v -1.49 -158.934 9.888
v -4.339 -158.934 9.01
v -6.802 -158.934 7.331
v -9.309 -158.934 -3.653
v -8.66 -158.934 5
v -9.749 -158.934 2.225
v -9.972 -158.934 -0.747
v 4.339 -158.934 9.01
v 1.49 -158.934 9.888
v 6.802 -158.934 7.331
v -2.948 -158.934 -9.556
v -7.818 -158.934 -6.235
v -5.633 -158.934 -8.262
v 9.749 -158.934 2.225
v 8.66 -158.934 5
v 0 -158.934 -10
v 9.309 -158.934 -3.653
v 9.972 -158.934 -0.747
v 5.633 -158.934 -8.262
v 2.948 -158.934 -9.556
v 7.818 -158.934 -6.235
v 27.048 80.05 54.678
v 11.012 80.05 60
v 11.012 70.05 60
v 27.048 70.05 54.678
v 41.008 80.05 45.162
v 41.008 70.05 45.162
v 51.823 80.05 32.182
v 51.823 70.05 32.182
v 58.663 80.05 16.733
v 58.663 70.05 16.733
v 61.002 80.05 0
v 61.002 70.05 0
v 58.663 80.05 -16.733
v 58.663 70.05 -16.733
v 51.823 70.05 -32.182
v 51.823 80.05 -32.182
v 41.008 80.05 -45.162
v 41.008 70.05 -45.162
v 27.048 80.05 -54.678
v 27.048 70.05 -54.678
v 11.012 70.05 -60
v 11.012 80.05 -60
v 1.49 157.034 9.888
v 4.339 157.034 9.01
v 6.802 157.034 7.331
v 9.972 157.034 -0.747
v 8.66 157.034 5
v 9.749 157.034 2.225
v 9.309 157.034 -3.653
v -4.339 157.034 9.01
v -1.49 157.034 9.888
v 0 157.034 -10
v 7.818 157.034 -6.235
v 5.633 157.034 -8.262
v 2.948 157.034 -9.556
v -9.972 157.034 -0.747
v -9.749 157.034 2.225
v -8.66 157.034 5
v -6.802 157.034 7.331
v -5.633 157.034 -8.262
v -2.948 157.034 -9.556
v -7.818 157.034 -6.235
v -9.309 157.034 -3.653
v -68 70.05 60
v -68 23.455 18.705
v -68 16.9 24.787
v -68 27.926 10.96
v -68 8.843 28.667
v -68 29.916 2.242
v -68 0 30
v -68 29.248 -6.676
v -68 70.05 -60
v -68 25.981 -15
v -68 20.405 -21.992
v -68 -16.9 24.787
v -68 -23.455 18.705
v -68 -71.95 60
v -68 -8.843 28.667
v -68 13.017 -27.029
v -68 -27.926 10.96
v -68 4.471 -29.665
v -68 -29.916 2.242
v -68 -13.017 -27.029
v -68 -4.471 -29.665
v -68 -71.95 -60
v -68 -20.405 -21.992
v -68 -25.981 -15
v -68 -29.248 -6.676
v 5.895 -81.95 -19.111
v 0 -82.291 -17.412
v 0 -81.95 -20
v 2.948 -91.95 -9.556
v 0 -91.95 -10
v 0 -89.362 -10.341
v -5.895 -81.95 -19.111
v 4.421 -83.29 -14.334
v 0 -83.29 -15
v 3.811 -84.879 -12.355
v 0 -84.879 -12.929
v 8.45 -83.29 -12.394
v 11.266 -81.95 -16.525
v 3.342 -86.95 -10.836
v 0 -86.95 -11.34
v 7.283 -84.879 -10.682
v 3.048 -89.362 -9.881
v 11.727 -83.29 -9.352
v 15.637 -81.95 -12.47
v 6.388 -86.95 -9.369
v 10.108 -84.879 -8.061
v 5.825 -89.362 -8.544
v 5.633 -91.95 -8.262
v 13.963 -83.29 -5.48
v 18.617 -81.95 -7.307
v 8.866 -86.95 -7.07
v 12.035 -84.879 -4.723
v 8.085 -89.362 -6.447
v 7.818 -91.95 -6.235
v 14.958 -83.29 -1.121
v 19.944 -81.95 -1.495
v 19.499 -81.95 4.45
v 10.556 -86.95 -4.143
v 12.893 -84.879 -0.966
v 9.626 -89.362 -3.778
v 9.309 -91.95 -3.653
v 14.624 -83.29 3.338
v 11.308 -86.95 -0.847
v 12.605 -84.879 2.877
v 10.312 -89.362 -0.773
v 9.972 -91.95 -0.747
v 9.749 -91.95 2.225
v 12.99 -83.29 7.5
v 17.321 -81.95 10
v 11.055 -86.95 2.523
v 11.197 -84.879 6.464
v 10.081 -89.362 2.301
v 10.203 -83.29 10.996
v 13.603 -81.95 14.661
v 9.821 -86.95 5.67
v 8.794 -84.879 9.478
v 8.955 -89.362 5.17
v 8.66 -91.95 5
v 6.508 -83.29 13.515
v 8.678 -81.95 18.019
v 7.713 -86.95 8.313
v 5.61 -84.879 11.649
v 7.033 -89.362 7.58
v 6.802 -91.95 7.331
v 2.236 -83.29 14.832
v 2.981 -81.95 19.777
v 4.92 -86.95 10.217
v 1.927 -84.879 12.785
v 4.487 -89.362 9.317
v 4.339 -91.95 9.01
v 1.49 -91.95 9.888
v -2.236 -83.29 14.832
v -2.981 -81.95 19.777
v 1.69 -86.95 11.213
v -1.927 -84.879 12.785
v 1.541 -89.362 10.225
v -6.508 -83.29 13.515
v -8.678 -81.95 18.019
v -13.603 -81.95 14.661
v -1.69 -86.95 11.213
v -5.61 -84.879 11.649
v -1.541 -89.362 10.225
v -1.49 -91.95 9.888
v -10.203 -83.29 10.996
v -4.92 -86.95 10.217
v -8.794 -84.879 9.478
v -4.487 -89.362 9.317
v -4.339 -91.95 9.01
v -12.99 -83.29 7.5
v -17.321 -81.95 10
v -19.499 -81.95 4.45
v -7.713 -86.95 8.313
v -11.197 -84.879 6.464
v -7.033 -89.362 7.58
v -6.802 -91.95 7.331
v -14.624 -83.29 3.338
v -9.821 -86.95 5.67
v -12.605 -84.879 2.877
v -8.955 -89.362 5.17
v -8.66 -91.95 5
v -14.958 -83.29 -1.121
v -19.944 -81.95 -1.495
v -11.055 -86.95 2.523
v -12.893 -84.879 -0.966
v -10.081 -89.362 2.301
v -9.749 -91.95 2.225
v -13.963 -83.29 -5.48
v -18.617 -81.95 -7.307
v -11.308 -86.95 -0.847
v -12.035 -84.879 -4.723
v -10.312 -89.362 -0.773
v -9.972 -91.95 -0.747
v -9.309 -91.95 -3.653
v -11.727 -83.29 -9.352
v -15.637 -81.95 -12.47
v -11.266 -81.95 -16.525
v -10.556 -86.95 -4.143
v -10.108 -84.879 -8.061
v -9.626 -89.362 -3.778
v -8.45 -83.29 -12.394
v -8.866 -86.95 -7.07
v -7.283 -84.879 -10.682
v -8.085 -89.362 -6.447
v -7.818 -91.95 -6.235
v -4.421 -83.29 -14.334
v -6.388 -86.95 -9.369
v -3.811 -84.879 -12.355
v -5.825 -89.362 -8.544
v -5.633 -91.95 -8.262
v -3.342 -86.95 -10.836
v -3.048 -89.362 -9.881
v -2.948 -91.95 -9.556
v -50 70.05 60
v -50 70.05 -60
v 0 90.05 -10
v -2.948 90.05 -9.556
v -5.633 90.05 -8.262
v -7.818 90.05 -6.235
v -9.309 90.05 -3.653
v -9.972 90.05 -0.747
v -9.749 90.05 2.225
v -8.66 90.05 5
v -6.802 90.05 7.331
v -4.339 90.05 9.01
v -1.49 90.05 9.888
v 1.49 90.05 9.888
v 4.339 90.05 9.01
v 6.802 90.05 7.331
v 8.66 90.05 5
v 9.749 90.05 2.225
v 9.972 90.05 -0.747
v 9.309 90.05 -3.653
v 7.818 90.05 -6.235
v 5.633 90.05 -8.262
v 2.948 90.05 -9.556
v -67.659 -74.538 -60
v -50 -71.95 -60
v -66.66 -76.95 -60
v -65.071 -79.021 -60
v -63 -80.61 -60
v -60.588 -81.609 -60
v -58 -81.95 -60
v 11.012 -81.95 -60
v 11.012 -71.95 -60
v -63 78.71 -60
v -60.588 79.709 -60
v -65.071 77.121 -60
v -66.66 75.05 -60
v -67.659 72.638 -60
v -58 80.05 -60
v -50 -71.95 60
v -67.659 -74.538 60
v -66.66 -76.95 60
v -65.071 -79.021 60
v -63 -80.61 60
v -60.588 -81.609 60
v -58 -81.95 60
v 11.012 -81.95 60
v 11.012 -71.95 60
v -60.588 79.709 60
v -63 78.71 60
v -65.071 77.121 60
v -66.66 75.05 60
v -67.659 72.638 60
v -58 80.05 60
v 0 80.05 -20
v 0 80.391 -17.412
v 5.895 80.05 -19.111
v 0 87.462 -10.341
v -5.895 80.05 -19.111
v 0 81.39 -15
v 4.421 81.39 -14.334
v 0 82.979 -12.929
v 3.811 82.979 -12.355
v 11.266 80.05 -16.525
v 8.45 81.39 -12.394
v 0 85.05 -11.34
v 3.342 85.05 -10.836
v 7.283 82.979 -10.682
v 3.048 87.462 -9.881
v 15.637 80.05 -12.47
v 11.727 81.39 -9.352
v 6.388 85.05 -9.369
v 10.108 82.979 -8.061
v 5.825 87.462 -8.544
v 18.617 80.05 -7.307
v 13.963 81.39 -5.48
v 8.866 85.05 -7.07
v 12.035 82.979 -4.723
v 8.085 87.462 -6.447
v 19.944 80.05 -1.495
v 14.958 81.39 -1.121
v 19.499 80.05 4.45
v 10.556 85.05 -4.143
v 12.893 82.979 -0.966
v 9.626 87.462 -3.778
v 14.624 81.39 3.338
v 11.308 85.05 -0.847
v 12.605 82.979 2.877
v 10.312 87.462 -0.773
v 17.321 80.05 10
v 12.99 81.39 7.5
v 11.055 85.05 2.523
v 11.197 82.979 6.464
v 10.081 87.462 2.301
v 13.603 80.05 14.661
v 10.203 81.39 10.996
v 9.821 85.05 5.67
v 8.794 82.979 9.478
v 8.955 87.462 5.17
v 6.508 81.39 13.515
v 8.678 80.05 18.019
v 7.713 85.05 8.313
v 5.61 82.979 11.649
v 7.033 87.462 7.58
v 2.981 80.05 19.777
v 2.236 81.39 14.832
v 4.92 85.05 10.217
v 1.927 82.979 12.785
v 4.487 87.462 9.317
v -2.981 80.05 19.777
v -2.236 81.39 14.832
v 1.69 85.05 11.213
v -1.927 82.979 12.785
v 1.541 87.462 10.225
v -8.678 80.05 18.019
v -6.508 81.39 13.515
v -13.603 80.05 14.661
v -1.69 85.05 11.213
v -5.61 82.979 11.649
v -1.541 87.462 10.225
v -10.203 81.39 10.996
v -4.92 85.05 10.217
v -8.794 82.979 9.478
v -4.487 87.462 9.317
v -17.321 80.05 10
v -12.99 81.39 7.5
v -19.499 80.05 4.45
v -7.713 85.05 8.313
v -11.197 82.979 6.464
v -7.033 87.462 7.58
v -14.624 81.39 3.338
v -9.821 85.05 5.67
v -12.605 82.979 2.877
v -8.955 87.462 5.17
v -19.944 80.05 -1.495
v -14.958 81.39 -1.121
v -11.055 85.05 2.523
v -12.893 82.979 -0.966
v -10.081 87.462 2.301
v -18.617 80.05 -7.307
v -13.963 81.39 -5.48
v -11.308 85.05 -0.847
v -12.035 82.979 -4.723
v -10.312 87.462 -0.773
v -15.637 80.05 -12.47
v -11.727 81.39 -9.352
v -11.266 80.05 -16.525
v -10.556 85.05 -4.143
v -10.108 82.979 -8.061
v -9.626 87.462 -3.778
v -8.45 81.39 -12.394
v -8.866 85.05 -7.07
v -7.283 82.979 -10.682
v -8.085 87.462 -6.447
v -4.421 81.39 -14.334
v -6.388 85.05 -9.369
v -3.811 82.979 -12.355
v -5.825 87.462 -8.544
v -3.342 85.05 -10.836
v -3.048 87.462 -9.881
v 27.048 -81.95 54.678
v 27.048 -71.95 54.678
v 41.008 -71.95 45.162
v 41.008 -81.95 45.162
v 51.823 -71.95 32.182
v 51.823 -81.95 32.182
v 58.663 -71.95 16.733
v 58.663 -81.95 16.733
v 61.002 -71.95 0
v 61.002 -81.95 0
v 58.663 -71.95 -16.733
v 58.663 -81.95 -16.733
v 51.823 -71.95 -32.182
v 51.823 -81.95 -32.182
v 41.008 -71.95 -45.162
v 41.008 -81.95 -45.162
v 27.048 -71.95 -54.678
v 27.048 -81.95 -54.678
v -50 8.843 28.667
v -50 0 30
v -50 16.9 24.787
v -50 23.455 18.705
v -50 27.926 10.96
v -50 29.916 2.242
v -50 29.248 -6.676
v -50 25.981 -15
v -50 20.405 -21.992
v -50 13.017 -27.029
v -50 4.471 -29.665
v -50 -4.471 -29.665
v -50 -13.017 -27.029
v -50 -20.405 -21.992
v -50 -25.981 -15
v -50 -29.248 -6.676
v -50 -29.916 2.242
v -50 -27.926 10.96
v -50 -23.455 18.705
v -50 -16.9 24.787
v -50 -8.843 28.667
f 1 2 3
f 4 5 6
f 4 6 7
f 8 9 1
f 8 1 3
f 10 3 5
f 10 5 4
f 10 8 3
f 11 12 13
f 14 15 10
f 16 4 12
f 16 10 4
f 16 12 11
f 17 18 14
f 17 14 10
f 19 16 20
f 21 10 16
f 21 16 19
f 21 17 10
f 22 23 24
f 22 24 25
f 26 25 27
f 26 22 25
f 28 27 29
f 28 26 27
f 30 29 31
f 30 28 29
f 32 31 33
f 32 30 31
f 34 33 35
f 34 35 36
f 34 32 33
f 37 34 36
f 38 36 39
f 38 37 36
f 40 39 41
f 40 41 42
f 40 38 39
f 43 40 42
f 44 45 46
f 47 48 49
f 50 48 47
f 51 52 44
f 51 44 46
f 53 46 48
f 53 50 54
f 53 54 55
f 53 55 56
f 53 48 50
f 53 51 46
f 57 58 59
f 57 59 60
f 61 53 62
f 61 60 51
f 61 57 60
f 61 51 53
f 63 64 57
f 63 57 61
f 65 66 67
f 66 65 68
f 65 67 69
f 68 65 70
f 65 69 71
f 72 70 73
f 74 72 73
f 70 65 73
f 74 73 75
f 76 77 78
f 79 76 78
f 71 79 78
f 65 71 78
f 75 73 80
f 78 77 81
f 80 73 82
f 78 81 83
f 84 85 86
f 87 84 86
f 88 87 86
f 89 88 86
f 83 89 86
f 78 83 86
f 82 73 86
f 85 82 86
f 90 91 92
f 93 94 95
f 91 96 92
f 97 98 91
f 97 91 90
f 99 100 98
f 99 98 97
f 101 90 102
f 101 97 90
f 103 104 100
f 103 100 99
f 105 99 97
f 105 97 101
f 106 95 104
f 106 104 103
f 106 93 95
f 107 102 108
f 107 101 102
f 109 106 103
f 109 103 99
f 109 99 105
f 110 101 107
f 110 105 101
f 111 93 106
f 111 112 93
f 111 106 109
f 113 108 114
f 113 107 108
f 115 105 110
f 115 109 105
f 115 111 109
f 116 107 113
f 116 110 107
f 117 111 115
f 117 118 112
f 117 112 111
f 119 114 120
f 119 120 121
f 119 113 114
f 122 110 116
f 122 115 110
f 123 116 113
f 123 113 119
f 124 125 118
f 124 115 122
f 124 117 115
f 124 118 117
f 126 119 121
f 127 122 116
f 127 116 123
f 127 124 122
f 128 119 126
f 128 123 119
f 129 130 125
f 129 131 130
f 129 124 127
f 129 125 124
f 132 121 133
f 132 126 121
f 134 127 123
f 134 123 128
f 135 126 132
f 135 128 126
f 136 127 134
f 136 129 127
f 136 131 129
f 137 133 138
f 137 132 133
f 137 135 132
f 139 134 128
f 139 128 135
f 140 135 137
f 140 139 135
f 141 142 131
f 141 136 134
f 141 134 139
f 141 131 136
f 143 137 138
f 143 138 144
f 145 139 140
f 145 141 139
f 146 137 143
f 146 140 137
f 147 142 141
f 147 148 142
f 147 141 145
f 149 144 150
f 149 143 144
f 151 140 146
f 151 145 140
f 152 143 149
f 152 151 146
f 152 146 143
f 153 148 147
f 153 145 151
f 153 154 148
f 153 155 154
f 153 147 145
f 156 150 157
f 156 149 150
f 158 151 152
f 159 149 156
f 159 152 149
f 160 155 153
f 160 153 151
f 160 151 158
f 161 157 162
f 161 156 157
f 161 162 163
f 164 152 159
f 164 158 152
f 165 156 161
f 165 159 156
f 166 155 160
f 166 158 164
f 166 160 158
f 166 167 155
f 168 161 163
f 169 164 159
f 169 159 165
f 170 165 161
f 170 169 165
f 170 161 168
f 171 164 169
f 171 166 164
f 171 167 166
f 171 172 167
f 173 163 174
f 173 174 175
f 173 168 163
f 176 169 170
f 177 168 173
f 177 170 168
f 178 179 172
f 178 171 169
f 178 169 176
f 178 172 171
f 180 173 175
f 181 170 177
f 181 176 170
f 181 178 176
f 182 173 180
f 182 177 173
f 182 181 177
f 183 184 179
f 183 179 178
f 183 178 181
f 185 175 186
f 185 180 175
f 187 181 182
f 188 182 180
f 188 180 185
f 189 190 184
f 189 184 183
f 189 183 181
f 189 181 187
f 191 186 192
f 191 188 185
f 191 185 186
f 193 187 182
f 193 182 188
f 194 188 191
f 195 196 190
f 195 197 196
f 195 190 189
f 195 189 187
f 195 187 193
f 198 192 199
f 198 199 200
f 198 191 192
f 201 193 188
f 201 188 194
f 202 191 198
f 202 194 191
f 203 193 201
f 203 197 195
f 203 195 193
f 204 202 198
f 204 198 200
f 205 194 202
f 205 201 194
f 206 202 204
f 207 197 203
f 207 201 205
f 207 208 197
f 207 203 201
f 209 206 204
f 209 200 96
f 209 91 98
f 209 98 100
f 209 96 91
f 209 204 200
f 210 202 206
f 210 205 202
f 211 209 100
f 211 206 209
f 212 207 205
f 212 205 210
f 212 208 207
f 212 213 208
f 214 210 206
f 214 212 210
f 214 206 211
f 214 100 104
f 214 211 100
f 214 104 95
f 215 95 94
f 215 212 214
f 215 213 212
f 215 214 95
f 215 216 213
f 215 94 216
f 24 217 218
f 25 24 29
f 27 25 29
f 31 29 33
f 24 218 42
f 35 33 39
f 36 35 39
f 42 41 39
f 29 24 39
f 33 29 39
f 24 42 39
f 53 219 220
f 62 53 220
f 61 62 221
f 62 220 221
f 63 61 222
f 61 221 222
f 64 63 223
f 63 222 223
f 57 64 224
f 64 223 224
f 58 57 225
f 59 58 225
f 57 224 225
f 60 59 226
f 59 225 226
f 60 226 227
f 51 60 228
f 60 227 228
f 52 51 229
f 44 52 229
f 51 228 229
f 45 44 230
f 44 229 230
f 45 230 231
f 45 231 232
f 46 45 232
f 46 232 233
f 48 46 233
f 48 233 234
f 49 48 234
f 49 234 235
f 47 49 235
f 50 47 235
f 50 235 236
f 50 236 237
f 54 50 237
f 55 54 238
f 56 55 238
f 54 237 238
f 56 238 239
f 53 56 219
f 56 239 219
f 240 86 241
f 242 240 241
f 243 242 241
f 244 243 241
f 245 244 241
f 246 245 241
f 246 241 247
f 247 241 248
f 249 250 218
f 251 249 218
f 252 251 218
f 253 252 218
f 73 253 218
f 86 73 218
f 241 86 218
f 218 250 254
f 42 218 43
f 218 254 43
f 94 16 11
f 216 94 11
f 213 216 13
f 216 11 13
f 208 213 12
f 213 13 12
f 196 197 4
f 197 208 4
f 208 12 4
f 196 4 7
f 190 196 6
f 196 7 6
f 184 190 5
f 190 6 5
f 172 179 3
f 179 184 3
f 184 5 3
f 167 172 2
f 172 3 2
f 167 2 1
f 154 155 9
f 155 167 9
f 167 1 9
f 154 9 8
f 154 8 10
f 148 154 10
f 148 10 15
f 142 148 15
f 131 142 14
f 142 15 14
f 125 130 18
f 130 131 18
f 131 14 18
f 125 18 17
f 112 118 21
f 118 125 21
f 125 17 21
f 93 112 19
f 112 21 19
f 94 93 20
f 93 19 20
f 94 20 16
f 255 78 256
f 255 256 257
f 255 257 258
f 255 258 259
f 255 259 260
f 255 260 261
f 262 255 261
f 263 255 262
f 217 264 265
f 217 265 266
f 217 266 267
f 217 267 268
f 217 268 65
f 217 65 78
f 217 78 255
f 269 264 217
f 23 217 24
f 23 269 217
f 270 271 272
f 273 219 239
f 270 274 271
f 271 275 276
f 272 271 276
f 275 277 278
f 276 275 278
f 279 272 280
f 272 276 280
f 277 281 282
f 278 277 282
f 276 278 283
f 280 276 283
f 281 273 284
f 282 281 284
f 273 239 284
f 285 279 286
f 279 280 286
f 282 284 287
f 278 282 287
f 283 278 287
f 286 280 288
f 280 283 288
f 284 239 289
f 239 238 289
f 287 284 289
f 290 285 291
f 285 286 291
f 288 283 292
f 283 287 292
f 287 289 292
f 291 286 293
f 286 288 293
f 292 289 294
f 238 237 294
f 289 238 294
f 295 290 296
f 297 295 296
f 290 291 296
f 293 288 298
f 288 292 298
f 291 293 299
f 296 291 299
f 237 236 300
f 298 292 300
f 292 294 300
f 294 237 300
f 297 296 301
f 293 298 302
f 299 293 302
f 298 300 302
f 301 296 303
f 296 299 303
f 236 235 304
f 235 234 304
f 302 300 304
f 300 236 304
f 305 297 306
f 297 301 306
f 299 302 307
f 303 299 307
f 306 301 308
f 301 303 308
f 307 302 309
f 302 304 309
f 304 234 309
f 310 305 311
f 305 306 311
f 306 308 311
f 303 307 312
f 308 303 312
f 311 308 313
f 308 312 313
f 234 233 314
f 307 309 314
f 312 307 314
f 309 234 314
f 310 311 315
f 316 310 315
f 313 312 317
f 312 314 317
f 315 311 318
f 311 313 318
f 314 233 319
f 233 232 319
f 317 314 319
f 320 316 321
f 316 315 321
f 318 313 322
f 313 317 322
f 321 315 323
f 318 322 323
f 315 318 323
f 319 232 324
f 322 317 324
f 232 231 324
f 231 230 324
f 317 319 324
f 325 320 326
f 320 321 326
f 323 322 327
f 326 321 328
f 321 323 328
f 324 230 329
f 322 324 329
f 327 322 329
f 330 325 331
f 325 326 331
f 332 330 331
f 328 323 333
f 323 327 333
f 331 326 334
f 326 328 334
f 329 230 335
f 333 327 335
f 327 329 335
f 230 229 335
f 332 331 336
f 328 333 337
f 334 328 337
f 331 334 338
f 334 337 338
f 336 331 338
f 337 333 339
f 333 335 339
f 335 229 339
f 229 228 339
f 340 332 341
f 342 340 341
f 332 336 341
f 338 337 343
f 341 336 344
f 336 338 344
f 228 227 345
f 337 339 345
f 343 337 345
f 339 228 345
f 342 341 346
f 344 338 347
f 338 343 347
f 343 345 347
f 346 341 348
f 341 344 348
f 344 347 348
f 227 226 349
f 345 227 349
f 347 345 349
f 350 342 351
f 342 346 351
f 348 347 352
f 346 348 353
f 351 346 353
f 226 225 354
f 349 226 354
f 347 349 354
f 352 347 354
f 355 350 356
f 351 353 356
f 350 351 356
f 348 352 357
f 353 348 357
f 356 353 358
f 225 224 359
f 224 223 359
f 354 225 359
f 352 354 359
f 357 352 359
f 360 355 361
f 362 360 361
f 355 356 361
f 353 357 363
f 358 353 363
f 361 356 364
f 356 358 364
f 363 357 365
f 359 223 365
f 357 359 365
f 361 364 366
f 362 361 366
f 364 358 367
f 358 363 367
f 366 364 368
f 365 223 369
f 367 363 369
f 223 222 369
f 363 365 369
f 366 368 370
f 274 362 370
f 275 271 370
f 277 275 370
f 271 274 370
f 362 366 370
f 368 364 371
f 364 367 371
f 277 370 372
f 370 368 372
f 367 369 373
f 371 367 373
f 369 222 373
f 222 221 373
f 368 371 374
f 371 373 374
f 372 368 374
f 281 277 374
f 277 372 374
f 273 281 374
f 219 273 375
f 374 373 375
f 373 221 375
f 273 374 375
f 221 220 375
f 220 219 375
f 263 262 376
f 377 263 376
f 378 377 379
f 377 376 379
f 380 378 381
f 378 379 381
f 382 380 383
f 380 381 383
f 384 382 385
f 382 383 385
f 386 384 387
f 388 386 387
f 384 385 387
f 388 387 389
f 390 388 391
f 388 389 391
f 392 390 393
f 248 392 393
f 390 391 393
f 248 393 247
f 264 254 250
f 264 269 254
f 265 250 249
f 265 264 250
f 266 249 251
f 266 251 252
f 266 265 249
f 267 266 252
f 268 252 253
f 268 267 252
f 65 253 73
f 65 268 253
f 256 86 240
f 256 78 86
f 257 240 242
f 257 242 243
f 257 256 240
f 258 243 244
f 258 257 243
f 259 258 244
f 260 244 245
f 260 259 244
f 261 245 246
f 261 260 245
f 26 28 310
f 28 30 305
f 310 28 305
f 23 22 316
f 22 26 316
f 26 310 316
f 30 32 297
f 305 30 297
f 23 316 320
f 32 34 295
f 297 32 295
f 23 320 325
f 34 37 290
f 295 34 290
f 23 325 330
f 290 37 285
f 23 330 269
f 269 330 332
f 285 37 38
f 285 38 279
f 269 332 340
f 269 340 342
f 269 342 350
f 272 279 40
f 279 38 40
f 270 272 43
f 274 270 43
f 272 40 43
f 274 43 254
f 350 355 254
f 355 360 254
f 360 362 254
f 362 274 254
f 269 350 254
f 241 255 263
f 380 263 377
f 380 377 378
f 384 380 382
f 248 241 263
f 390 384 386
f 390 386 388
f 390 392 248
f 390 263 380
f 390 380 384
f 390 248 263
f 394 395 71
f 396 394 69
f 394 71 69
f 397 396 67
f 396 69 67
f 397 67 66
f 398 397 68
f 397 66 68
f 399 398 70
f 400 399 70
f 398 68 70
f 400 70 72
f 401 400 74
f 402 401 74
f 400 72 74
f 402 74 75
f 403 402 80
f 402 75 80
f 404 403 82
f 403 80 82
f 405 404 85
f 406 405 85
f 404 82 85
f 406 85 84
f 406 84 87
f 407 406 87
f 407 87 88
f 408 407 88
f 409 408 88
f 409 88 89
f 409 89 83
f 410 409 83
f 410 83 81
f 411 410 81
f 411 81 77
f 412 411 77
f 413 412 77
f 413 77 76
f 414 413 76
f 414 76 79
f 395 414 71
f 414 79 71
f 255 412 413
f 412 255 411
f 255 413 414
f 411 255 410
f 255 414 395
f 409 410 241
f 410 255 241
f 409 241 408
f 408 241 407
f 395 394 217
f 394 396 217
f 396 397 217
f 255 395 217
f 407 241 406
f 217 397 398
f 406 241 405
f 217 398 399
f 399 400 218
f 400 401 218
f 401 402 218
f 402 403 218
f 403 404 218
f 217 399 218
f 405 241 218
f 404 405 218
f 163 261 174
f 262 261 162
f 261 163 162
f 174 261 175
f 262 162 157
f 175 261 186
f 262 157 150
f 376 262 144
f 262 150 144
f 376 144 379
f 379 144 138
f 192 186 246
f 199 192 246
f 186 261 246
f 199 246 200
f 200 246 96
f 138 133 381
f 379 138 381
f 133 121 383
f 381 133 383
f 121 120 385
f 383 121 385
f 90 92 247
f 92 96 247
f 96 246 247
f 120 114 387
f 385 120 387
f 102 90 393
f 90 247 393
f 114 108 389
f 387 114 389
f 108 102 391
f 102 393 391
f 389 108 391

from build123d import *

# Parameters (mm, degrees)
SWEEP1_PROFILE_R    = 10
CUT_EXTRUDE1_START  = -5.9
SKETCH13_R          = 10
CUT_EXTRUDE1_DEPTH  = 5.9
SKETCH14_R          = 10
BOSS_EXTRUDE1_DEPTH = 4
BOSS_EXTRUDE2_DEPTH = 10
BOSS_EXTRUDE3_DEPTH = 120
SKETCH18_W          = 120
SKETCH18_H          = 142
CUT_EXTRUDE2_DEPTH  = 203.932082269
SKETCH19_R          = 30
CUT_EXTRUDE3_DEPTH  = 18
FILLET1_R           = 10


with BuildPart() as part:
    # Sweep1: sweep along a path in Sketch2
    with BuildLine(Plane(origin=(0, 0, 0), x_dir=(0, 0, -1), z_dir=(1, 0, 0))) as sweep1_path:
        Line((0, 158.93373393), (0, -158.93373393))
    # Sweep1 profile (on start of the path) → Sweep1 (sweep)
    with BuildSketch(Plane(origin=(0, 158.93373393, 0), x_dir=(0, 0, -1), z_dir=(0, -1, 0))):
        Circle(SWEEP1_PROFILE_R)
    sweep(path=sweep1_path.line)

    # Sketch13 → Cut-Extrude1 (cut)
    with BuildSketch(Plane(origin=(0, 158.93373393, 0), x_dir=(1, 0, 0), z_dir=(0, 1, 0)).offset(CUT_EXTRUDE1_START)):
        with Locations(Location((0, 0, 0), (0, 0, 90))):
            Circle(SKETCH13_R)
    extrude(amount=CUT_EXTRUDE1_DEPTH, mode=Mode.SUBTRACT)

    # Sketch14 → Boss-Extrude1 (add)
    with BuildSketch(Plane(origin=(0, 153.03373393, 0), x_dir=(1, 0, 0), z_dir=(0, 1, 0))):
        with Locations(Location((0, 0, 0), (0, 0, 90))):
            Circle(SKETCH14_R)
    extrude(amount=BOSS_EXTRUDE1_DEPTH)

    # Sketch16 → Boss-Extrude2 (add)
    with BuildSketch(Plane(origin=(0, 80.05, 0), x_dir=(-1, 0, 0), z_dir=(0, -1, 0))):
        with BuildLine():
            Line((11.012438692, 60), (60, 60))
            Line((60, 60), (60, -60))
            Line((60, -60), (11.012438692, -60))
            Line((11.012438692, -60), (-11.012438692, -60))
            ThreePointArc((-11.012438692, -60), (-61.00224427, 0), (-11.012438692, 60))
            Line((-11.012438692, 60), (11.012438692, 60))
        make_face()
    boss_extrude2 = extrude(amount=BOSS_EXTRUDE2_DEPTH)

    # Mirror1: Boss-Extrude2 across plane
    add(boss_extrude2.mirror(Plane(origin=(0, -0.95, 0), x_dir=(0, 0, 1), z_dir=(0, -1, 0))))

    # Sketch17 → Boss-Extrude3 (add)
    with BuildSketch(Plane(origin=(0, 0, -60), x_dir=(-1, 0, 0), z_dir=(0, 0, -1))):
        Polygon((60, -71.95), (50, -71.95), (50, 70.05), (60, 70.05), (60, 80.05), (68, 80.05), (68, -81.95), (60, -81.95), align=None)
    extrude(amount=-BOSS_EXTRUDE3_DEPTH)

    # Sketch18 → Cut-Extrude2 (cut, through all)
    with BuildSketch(Plane(origin=(-50, 0, 0), x_dir=(0, 0, -1), z_dir=(1, 0, 0))):
        with Locations((0, -0.95)):
            Rectangle(SKETCH18_W, SKETCH18_H)
    extrude(amount=CUT_EXTRUDE2_DEPTH, mode=Mode.SUBTRACT)

    # Sketch19 → Cut-Extrude3 (cut)
    with BuildSketch(Plane.ZY.offset(68)):
        Circle(SKETCH19_R)
    extrude(amount=-CUT_EXTRUDE3_DEPTH, mode=Mode.SUBTRACT)

    # Fillet1
    fillet1_edges = [part.edges().sort_by_distance(p)[0] for p in [
        (0, 80.05, 10),
        (0, -81.95, 10),
        (-68, 80.05, 0),
        (-68, -81.95, 0),
    ]]
    fillet(fillet1_edges, radius=FILLET1_R)


solid = part.part
